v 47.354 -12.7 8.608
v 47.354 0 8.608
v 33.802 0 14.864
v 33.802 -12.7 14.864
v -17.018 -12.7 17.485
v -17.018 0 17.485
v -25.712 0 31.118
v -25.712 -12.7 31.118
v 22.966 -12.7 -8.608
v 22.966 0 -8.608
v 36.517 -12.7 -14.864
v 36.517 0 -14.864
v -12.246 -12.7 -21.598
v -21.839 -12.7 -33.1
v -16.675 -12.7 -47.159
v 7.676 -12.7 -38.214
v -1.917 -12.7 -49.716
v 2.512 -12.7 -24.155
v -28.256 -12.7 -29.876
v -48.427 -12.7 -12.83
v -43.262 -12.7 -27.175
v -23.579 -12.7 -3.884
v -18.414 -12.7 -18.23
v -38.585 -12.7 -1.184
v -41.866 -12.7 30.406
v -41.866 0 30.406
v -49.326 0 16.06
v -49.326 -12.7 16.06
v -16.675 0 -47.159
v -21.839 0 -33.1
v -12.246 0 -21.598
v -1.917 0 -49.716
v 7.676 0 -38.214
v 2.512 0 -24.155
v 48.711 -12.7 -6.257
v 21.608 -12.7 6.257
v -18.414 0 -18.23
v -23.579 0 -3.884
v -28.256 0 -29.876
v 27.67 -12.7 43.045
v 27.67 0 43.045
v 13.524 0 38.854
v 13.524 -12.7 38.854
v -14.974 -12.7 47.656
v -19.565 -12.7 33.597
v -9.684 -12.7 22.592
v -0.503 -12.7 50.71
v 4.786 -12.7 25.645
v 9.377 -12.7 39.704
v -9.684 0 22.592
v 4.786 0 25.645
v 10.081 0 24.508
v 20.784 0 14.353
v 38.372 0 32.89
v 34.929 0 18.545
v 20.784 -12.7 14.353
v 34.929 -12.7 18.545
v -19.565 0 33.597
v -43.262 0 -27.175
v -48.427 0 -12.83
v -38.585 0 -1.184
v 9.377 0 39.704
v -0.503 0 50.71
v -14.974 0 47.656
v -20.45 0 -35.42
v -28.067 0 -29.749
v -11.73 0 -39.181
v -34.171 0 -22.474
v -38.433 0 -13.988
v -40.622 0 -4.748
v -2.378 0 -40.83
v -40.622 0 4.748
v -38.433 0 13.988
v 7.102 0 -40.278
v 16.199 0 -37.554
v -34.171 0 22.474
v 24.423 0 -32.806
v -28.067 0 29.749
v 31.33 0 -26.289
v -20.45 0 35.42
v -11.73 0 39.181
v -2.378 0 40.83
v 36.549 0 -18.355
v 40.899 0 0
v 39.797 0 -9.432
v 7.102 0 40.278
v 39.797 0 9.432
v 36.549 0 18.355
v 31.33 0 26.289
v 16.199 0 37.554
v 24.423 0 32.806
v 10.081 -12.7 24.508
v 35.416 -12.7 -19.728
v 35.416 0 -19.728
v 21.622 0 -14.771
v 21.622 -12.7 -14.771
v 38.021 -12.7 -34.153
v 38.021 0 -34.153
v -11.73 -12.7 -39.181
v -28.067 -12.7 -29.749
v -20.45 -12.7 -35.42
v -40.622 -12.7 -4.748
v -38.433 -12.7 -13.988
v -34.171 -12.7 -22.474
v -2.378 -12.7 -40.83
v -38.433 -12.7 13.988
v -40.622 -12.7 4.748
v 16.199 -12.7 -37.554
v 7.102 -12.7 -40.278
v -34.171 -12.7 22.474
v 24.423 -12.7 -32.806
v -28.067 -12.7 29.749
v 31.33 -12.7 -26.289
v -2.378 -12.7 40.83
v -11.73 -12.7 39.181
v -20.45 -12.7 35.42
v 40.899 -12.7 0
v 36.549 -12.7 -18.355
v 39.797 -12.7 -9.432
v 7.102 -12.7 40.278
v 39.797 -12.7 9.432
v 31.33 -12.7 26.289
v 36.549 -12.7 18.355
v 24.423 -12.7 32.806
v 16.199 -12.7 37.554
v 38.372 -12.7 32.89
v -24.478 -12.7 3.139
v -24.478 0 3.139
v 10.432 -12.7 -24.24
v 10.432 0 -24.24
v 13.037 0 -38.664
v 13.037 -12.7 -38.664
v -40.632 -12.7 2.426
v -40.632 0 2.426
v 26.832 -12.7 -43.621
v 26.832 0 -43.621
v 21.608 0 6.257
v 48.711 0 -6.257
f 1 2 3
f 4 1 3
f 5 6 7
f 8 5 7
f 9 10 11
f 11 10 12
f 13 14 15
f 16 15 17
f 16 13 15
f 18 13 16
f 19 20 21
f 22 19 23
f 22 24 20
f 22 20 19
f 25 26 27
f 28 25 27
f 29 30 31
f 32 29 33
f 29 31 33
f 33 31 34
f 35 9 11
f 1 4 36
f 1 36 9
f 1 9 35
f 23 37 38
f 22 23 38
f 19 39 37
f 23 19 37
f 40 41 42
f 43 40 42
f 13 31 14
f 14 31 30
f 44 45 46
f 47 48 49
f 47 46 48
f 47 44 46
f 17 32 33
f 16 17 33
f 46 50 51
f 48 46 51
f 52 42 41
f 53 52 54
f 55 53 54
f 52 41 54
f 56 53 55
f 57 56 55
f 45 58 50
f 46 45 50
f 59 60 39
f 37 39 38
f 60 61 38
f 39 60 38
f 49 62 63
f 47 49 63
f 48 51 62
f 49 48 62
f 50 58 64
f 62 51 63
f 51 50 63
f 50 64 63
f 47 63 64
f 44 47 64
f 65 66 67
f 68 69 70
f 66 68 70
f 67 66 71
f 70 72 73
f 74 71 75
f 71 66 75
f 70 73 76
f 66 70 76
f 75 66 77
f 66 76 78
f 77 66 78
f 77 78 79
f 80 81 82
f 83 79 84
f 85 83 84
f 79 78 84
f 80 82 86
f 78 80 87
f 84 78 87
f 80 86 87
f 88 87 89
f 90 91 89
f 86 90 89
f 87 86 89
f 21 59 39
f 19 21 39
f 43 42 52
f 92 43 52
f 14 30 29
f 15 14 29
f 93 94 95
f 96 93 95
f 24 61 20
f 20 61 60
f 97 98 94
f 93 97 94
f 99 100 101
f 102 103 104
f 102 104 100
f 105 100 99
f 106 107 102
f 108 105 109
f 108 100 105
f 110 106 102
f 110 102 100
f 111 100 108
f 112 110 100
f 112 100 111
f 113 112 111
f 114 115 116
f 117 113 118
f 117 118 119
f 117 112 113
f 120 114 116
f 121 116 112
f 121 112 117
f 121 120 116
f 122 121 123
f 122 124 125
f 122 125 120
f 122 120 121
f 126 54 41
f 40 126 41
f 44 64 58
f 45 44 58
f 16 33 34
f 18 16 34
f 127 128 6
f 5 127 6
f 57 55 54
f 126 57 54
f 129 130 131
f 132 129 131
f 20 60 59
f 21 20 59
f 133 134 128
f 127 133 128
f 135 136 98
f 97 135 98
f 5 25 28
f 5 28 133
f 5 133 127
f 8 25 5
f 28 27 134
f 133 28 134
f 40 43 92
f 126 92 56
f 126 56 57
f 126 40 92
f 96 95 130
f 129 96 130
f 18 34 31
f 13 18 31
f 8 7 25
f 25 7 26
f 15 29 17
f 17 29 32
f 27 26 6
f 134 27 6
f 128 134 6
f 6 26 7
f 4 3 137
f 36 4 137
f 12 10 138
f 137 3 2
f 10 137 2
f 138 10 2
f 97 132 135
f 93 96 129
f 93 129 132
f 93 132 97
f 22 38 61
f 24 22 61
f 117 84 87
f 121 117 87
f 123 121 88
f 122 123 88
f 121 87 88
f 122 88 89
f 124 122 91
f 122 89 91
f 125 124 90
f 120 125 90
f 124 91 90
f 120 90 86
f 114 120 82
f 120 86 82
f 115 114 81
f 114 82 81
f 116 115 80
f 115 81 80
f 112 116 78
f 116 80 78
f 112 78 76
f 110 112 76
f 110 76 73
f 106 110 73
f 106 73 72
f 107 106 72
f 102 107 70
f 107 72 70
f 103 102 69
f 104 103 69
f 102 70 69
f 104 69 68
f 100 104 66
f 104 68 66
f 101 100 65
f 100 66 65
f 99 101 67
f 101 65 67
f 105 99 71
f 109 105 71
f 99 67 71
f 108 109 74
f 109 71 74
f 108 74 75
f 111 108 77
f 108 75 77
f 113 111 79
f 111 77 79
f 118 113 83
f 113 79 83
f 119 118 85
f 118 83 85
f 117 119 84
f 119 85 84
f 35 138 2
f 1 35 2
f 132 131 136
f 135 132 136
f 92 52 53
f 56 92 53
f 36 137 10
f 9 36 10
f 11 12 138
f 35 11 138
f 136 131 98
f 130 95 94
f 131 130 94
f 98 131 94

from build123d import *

# Parameters (mm, degrees)
F8_DEPTH = 12.7
F0_R     = 40.899023384


with BuildPart() as f8:
    # F7 (on Front) → F8 (new body)
    with BuildSketch(Plane.XZ):
        Polygon((34.929034287, 18.5445526985), (38.3720500526, 32.8904484959), (27.6696477349, 43.0451355133), (13.5242296514, 38.8539267333), (10.0812138858, 24.5080309359), (20.7836162035, 14.3533439185), align=None)
    extrude(amount=F8_DEPTH)


with BuildPart() as f8b:
    # F6 (on Front) → F8, piece 2 (new body)
    with BuildSketch(Plane.XZ):
        Polygon((36.5170137254, -14.8640945163), (48.711027089, -6.2565561775), (47.3536869053, 8.6075383388), (33.8023333581, 14.8640945163), (21.6083199946, 6.2565561775), (22.9656601783, -8.6075383388), align=None)
    extrude(amount=F8_DEPTH)


with BuildPart() as f8c:
    # F5 (on Front) → F8, piece 3 (new body)
    with BuildSketch(Plane.XZ):
        Polygon((26.8315154482, -43.6209968592), (38.0213182997, -34.1527008151), (35.4164348207, -19.7278992603), (21.6217484902, -14.7713937496), (10.4319456387, -24.2396897937), (13.0368291177, -38.6644913485), align=None)
    extrude(amount=F8_DEPTH)


with BuildPart() as f8d:
    # F4 (on Front) → F8, piece 4 (new body)
    with BuildSketch(Plane.XZ):
        Polygon((-21.8393272707, -33.0997500807), (-16.6748025468, -47.1587311238), (-1.9171054502, -49.715612036), (7.6760669225, -38.2135119051), (2.5115421987, -24.154530862), (-12.246154898, -21.5976499498), align=None)
    extrude(amount=F8_DEPTH)


with BuildPart() as f8e:
    # F3 (on Front) → F8, piece 5 (new body)
    with BuildSketch(Plane.XZ):
        Polygon((-48.4265006134, -12.8295531867), (-43.2619758895, -27.1754489841), (-28.255803327, -29.8757872734), (-18.4141554883, -18.2302297654), (-23.5786802122, -3.884333968), (-38.5848527747, -1.1839956786), align=None)
    extrude(amount=F8_DEPTH)


with BuildPart() as f8f:
    # F1 (on Front) → F8, piece 6 (new body)
    with BuildSketch(Plane.XZ):
        Polygon((4.7862858646, 25.6454034841), (9.3769735522, 39.7043839896), (-0.503116873, 50.7095264005), (-14.9738949858, 47.6556883061), (-19.5645826734, 33.5967078006), (-9.6844922482, 22.5915653897), align=None)
    extrude(amount=F8_DEPTH)


with BuildPart() as f8g:
    # F2 (on Front) → F8, piece 7 (new body)
    with BuildSketch(Plane.XZ):
        Polygon((-24.4778691455, 3.1388995099), (-17.0180016533, 17.4847974581), (-25.7119799704, 31.1181811894), (-41.8658257798, 30.4056669724), (-49.325693272, 16.0597690242), (-40.6317149549, 2.426385293), align=None)
    extrude(amount=F8_DEPTH)


with BuildPart() as f8h:
    # F0 (on Front) → F8, piece 8 (new body)
    with BuildSketch(Plane.XZ):
        Circle(F0_R)
    extrude(amount=F8_DEPTH)


solid = Compound([f8.part, f8b.part, f8c.part, f8d.part, f8e.part, f8f.part, f8g.part, f8h.part])
